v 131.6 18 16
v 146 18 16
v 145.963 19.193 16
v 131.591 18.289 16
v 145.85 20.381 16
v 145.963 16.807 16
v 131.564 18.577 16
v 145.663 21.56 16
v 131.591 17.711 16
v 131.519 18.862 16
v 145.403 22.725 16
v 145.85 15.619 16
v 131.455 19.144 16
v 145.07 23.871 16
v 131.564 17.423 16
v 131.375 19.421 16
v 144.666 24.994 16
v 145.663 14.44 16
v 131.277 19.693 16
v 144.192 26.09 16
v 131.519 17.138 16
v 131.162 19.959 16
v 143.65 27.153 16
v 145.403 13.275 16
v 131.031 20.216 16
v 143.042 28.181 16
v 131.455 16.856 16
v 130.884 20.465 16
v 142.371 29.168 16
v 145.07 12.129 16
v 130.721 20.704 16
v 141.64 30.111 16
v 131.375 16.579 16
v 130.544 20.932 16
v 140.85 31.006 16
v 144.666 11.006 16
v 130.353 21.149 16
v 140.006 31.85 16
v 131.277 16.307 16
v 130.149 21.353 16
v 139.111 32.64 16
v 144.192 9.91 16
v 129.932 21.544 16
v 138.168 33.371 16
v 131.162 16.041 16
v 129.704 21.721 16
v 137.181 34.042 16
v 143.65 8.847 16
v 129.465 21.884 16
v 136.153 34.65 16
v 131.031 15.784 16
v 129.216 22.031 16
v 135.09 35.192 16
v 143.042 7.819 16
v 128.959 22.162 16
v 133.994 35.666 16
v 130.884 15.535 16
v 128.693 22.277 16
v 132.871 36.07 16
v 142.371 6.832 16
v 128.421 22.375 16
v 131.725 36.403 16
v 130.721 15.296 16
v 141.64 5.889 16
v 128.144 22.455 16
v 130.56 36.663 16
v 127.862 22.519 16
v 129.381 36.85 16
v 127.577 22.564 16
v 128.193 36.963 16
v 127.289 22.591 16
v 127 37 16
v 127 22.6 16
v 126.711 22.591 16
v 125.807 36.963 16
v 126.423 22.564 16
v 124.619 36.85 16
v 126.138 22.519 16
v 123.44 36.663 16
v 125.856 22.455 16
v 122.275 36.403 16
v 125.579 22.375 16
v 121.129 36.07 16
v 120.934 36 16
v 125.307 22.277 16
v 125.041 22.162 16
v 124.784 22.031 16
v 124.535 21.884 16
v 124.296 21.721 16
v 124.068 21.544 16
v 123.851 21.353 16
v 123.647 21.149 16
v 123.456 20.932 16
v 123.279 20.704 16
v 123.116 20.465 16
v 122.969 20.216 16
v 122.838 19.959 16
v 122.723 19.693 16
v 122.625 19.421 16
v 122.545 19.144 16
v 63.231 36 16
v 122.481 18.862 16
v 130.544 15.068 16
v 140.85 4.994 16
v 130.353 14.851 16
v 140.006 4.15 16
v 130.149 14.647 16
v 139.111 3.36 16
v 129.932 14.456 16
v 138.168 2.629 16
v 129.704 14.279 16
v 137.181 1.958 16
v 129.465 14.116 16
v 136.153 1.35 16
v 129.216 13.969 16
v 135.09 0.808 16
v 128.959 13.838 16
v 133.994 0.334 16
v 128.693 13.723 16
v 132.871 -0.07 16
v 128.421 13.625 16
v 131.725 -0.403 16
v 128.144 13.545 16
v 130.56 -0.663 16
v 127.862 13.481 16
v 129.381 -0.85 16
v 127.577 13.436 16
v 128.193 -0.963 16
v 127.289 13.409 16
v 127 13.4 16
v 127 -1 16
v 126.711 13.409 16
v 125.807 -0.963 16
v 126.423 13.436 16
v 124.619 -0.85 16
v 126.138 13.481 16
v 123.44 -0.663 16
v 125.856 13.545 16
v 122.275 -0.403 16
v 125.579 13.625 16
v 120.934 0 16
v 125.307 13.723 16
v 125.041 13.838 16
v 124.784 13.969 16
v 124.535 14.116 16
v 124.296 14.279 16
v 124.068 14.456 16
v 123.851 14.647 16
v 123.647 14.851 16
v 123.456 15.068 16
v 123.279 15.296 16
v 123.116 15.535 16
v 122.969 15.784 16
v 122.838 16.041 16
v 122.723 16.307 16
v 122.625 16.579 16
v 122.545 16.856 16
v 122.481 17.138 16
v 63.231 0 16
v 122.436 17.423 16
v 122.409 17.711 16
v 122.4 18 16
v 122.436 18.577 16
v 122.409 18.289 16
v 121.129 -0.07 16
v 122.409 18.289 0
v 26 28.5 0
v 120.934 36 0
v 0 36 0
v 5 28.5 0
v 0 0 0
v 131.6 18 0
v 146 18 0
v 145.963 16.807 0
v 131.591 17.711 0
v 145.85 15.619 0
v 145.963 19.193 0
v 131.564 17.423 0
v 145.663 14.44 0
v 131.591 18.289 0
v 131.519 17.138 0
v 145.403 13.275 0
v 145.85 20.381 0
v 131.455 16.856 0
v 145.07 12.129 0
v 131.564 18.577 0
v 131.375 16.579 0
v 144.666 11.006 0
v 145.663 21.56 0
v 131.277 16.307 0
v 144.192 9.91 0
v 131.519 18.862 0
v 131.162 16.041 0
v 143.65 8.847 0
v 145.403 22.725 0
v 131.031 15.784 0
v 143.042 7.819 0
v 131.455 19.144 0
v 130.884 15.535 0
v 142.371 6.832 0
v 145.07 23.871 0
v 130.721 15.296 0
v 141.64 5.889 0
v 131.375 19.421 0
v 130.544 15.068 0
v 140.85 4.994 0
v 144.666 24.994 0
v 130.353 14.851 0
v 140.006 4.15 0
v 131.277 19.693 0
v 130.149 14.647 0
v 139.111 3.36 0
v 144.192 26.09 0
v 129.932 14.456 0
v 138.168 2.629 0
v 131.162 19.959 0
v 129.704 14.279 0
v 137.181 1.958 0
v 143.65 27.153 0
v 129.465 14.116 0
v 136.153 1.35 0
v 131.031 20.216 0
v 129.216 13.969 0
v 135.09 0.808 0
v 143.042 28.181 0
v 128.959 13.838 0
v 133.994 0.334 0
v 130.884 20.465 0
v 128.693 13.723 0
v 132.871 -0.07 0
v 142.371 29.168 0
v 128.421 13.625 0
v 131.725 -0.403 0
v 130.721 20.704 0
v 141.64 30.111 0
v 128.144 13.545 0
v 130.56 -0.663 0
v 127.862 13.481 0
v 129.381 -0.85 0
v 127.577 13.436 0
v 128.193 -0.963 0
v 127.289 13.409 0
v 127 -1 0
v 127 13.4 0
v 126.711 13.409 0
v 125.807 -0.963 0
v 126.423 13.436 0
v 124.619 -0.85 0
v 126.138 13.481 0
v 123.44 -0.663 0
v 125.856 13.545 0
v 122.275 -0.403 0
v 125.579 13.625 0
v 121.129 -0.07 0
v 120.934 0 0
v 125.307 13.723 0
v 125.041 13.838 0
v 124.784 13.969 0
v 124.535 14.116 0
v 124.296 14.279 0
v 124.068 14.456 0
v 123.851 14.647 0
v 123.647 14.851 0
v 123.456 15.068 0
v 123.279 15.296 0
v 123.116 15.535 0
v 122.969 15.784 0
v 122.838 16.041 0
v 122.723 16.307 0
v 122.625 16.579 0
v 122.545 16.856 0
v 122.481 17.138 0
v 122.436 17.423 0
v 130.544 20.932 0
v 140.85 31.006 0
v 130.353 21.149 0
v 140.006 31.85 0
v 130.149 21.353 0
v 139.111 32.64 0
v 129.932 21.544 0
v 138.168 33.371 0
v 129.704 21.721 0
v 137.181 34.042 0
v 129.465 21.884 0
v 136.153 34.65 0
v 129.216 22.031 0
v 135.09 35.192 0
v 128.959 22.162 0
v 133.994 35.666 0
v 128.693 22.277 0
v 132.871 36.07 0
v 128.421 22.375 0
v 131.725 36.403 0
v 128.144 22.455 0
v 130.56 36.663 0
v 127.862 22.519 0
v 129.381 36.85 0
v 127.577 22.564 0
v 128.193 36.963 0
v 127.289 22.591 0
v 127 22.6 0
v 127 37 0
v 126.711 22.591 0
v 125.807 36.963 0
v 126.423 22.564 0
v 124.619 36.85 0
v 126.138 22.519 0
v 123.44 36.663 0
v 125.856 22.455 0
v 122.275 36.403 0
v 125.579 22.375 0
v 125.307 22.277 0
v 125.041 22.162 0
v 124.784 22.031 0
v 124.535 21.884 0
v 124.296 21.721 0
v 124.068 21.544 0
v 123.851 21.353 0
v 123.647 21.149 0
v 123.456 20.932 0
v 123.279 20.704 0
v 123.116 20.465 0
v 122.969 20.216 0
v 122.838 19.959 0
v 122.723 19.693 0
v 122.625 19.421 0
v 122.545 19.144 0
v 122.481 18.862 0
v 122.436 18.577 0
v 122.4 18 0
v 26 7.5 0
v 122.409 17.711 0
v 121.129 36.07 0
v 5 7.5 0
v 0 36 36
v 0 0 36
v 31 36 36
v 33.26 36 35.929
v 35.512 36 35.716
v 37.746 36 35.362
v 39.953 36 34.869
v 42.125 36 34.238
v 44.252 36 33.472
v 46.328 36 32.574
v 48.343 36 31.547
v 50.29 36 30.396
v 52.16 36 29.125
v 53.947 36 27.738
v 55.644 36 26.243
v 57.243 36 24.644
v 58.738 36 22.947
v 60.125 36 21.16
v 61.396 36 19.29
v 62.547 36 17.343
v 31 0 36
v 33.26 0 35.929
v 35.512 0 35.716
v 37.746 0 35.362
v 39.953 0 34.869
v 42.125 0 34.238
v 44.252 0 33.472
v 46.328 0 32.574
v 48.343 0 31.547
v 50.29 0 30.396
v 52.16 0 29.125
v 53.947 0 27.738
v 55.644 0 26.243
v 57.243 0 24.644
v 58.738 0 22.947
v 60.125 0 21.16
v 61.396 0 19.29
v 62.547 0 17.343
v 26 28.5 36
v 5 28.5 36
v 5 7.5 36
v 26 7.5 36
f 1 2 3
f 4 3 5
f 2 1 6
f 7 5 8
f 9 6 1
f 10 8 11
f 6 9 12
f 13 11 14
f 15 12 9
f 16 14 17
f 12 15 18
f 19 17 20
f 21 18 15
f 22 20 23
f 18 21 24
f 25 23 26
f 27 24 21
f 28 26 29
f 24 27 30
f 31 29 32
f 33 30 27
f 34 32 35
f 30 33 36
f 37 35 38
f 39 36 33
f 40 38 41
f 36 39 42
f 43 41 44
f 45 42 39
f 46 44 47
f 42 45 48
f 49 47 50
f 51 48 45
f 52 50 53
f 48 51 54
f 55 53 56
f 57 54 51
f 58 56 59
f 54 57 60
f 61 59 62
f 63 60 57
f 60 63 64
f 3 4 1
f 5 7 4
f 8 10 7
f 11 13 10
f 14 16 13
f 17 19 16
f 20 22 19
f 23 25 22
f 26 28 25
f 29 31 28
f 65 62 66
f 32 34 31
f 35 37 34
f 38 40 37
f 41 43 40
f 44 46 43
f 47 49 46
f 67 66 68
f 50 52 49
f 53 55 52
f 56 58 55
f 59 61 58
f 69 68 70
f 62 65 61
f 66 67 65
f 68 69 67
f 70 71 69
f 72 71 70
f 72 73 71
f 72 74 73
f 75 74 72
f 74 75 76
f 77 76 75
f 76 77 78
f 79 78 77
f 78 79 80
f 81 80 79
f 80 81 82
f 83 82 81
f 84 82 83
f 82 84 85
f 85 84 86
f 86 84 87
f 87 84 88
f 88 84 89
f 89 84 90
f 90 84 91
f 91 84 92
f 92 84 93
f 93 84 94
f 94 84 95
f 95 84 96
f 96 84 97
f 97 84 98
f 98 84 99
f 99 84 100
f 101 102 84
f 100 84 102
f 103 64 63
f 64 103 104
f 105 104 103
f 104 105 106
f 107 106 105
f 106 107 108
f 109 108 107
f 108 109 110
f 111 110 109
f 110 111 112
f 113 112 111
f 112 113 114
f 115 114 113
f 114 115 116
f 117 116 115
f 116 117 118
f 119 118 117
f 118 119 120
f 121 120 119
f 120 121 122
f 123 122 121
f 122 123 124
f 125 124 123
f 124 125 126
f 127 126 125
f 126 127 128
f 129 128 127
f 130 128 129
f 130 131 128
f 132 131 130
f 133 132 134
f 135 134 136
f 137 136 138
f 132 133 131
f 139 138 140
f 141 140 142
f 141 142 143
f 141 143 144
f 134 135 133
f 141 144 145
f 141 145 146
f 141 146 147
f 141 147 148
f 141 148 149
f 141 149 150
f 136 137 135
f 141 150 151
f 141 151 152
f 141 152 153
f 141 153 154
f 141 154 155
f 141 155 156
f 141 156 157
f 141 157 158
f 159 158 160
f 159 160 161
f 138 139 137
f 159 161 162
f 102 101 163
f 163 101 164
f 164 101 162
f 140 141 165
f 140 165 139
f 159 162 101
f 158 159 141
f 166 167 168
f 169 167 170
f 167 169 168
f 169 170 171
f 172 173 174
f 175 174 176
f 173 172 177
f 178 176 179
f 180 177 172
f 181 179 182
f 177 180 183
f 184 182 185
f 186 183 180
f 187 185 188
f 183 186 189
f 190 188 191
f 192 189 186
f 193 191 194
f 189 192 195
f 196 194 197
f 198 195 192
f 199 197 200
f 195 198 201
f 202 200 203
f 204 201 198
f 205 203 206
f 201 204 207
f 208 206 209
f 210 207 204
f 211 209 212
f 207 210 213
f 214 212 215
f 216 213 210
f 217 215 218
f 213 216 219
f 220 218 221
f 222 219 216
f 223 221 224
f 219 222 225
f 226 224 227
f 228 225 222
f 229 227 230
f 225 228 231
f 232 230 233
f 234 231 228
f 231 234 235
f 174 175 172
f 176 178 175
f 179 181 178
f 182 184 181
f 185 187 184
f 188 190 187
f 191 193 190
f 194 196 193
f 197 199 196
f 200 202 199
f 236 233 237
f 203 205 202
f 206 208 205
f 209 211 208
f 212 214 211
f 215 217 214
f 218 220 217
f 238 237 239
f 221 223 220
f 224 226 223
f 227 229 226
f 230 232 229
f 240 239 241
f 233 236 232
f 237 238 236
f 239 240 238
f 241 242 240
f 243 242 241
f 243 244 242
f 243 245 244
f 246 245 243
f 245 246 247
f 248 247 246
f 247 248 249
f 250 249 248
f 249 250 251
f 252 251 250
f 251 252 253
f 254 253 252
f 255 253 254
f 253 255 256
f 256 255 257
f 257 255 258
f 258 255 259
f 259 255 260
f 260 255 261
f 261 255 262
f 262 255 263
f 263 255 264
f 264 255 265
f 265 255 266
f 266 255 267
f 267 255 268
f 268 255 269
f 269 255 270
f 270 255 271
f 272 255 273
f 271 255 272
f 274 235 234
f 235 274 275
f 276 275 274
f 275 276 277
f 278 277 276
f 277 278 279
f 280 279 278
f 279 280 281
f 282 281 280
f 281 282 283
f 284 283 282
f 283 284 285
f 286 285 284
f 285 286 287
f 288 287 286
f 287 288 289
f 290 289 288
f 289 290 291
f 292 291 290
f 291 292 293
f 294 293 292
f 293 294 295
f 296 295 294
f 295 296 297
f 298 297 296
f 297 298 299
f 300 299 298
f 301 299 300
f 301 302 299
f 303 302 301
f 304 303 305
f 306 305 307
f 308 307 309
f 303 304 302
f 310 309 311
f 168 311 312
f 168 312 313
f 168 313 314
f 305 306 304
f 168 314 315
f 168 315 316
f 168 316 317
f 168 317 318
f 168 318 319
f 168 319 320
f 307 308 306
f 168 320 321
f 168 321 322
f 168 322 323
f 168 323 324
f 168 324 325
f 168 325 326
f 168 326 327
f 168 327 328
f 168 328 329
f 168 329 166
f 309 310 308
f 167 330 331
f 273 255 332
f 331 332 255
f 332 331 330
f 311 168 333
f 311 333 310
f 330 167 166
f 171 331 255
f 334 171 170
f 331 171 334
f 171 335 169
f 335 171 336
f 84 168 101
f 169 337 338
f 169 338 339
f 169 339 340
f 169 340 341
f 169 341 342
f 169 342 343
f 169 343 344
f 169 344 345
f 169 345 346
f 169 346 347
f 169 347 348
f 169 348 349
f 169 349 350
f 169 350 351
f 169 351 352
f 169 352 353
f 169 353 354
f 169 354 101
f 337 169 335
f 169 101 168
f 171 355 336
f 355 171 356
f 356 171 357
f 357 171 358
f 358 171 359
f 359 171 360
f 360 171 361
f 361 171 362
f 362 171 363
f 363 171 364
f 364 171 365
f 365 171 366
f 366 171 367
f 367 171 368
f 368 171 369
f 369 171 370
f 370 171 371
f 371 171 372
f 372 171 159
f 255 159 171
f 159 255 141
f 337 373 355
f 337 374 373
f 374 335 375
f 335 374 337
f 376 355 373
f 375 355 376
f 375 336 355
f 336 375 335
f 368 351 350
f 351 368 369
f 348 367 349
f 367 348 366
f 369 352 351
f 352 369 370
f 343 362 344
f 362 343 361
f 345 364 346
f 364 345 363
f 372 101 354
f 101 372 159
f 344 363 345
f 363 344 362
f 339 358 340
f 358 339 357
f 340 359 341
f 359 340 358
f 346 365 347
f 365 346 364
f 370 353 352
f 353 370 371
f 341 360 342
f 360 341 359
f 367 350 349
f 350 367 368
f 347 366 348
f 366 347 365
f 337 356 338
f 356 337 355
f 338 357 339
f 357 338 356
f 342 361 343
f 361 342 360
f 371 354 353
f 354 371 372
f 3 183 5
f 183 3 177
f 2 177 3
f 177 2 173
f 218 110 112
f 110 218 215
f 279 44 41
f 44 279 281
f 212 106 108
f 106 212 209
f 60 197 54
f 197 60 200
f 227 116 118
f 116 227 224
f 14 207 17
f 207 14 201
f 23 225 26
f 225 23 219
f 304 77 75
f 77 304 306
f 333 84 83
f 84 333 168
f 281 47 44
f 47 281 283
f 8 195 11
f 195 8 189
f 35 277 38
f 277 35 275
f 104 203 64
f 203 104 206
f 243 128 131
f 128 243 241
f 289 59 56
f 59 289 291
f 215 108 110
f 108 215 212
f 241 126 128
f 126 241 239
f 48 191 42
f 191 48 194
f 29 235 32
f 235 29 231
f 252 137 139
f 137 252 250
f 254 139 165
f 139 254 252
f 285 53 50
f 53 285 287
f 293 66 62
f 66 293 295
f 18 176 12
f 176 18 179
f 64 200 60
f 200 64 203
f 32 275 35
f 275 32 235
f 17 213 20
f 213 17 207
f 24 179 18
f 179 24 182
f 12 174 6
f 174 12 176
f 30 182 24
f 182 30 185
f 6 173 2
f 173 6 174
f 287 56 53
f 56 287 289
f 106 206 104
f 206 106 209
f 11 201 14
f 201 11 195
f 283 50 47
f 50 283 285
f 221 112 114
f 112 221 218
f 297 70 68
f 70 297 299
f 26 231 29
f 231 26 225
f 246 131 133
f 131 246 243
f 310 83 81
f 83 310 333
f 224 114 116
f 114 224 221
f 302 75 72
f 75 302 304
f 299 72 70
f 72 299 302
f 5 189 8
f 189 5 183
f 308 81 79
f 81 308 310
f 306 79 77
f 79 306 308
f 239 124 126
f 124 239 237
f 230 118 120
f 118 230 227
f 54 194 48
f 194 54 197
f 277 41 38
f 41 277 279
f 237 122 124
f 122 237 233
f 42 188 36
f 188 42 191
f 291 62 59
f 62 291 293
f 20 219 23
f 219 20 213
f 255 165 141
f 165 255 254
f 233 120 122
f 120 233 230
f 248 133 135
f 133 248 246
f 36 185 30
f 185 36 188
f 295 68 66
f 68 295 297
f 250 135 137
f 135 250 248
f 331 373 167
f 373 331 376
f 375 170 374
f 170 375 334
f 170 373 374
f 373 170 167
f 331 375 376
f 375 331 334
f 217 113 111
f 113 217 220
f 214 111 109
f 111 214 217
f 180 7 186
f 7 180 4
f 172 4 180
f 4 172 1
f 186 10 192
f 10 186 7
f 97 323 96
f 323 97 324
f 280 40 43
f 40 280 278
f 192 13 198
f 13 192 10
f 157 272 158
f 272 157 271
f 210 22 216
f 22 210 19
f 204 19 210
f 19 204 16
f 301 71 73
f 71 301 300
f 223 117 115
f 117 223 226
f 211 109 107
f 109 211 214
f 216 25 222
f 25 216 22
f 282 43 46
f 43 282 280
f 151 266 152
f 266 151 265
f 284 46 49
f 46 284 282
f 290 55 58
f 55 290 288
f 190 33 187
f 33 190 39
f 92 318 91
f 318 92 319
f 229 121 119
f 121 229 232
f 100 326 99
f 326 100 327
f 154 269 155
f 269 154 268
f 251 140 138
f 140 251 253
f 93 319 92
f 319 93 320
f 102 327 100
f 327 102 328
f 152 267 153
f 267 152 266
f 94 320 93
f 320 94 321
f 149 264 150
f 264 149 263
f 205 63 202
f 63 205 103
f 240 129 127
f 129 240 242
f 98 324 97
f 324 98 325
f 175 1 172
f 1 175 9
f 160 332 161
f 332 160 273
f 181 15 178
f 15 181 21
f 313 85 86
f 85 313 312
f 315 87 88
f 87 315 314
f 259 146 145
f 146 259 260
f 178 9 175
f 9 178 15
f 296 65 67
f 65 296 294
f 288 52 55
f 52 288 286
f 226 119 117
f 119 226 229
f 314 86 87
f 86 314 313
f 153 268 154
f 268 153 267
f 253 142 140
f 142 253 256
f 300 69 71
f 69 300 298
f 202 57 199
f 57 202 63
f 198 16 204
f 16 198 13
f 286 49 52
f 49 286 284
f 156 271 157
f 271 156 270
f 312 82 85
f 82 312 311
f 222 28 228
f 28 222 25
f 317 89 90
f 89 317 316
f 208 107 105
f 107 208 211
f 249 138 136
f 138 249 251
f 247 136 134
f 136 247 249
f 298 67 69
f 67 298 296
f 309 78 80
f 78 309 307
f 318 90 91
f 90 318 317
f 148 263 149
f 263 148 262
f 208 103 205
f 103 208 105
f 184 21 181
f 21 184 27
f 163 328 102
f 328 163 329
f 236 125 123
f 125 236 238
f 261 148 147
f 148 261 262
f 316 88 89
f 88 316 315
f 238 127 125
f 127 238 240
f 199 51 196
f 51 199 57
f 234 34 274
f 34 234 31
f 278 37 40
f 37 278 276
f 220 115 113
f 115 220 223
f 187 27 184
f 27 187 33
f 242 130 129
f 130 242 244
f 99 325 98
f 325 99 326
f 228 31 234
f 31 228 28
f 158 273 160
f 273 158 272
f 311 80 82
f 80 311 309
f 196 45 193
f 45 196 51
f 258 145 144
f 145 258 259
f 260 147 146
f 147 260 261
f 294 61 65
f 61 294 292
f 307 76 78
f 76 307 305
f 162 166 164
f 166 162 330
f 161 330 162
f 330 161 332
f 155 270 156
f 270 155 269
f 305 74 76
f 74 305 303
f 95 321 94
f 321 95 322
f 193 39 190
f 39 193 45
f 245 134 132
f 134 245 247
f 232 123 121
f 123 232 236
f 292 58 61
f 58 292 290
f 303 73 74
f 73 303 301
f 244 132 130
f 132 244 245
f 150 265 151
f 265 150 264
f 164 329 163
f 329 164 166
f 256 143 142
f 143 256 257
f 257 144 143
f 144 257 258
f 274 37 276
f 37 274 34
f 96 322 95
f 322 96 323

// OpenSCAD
cube1 = [127,36,16];
cube2 = [31,36,36];
cube3 = [21,21,cube2[2]];
tube_ir = 4.6;
tube_or = 19; // ikke 18? som i cube1[1]/2?

module skalk(inner_r, outer_r, thickness, angle=360) {
    rotate_extrude(convexity = 10, angle=angle)
        translate([inner_r, 0, 0])
            square([outer_r,thickness]);
}

module tube(inner_r, outer_r, length) {
    difference() {
        cylinder(h=length, r=outer_r);
        cylinder(h=length, r=inner_r);
    }
}

difference() {
    union() {
        cube(cube1);
        cube(cube2);
        translate([cube2[0],0,0]) {
            rotate([270,270,0]) {
                skalk(0, cube2[1], cube2[1], 90, $fn=100);
            }
        }
        translate([cube1[0],cube1[1]/2,0]) {
            cylinder(r=tube_or, h=cube1[2], $fn=100);
        }
    }
    translate([(cube2[0]-cube3[0])/2,(cube2[1]-cube3[1])/2,0]) {
        cube(cube3);
    }
    translate([cube1[0],cube1[1]/2,0]) {
        cylinder(r=tube_ir, h=cube1[2], $fn=100);
    }
}
